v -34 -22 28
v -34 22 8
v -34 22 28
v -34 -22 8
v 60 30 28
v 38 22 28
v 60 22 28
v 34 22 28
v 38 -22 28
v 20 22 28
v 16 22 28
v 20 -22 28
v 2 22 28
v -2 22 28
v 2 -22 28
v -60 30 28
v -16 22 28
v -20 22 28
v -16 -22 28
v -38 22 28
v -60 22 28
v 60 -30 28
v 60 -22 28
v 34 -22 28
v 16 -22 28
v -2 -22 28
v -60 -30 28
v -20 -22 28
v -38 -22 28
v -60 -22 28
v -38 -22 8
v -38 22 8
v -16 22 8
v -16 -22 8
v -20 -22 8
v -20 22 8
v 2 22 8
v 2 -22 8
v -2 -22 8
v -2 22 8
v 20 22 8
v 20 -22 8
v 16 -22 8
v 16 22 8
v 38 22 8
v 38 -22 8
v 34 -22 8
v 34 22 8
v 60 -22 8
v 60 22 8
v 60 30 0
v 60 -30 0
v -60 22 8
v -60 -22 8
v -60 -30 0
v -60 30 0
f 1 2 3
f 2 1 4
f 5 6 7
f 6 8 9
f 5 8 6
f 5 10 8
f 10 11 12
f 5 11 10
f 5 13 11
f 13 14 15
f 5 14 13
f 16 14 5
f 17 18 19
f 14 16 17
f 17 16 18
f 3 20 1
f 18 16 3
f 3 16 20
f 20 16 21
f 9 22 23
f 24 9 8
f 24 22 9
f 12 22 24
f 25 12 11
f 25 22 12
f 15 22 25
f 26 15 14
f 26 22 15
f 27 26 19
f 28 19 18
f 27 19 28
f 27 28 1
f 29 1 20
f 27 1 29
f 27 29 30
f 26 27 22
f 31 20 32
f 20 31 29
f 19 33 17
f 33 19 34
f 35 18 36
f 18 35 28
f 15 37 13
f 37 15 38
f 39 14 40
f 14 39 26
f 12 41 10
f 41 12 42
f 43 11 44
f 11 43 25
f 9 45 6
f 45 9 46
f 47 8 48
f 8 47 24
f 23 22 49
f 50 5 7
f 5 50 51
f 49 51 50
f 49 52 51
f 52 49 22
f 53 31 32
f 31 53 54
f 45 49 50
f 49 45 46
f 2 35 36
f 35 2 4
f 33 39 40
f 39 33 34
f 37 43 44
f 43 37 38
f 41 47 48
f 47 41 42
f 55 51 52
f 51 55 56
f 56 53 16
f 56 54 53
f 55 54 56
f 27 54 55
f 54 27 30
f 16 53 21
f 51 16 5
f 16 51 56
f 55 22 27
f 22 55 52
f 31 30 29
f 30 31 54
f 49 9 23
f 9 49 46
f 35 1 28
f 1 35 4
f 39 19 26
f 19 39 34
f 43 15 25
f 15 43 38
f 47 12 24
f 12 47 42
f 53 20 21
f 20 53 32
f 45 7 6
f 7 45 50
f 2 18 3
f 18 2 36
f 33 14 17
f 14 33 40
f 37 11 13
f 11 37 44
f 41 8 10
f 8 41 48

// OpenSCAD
$fn = 32;

// ----------------------------------------------------------------------
// Rib frame 120 x 60 x 28
// 5 ribs at 18 mm pitch
// ----------------------------------------------------------------------

// --- parameters (mm) ---
frame = [120, 60, 8];  // base plate size (x, y, z)
rail_w = 8;            // side rail width
ribs = 5;              // number of ribs
rib_t = 4;             // rib thickness
rib_h = 20;            // rib height above the base plate
pitch = 18;            // pitch between rib centres

// --- derived feature positions (mm) ---
span = (ribs - 1) * pitch;          // = 72   distance between the outer ribs
origin_x = -span / 2;               // = -36   X of the first rib
rib_len = frame[1] - 2 * rail_w + 2;  // = 46   rib length, 1 mm into each rail
feature_centers = [
  [origin_x + 0 * pitch, 0],
  [origin_x + 1 * pitch, 0],
  [origin_x + 2 * pitch, 0],
  [origin_x + 3 * pitch, 0],
  [origin_x + 4 * pitch, 0]
];   // rib centre line, drives the rib loop

// base plate, two side rails, then the ribs read straight off feature_centers
union() {
  translate([-frame[0] / 2, -frame[1] / 2, 0]) cube(frame);
  translate([-frame[0] / 2, -frame[1] / 2, 0]) cube([frame[0], rail_w, frame[2] + rib_h]);
  translate([-frame[0] / 2, frame[1] / 2 - rail_w, 0]) cube([frame[0], rail_w, frame[2] + rib_h]);
  for (centre = feature_centers)
    translate([centre[0] - rib_t / 2, centre[1] - rib_len / 2, frame[2] - 1])
      cube([rib_t, rib_len, rib_h + 1]);
}
